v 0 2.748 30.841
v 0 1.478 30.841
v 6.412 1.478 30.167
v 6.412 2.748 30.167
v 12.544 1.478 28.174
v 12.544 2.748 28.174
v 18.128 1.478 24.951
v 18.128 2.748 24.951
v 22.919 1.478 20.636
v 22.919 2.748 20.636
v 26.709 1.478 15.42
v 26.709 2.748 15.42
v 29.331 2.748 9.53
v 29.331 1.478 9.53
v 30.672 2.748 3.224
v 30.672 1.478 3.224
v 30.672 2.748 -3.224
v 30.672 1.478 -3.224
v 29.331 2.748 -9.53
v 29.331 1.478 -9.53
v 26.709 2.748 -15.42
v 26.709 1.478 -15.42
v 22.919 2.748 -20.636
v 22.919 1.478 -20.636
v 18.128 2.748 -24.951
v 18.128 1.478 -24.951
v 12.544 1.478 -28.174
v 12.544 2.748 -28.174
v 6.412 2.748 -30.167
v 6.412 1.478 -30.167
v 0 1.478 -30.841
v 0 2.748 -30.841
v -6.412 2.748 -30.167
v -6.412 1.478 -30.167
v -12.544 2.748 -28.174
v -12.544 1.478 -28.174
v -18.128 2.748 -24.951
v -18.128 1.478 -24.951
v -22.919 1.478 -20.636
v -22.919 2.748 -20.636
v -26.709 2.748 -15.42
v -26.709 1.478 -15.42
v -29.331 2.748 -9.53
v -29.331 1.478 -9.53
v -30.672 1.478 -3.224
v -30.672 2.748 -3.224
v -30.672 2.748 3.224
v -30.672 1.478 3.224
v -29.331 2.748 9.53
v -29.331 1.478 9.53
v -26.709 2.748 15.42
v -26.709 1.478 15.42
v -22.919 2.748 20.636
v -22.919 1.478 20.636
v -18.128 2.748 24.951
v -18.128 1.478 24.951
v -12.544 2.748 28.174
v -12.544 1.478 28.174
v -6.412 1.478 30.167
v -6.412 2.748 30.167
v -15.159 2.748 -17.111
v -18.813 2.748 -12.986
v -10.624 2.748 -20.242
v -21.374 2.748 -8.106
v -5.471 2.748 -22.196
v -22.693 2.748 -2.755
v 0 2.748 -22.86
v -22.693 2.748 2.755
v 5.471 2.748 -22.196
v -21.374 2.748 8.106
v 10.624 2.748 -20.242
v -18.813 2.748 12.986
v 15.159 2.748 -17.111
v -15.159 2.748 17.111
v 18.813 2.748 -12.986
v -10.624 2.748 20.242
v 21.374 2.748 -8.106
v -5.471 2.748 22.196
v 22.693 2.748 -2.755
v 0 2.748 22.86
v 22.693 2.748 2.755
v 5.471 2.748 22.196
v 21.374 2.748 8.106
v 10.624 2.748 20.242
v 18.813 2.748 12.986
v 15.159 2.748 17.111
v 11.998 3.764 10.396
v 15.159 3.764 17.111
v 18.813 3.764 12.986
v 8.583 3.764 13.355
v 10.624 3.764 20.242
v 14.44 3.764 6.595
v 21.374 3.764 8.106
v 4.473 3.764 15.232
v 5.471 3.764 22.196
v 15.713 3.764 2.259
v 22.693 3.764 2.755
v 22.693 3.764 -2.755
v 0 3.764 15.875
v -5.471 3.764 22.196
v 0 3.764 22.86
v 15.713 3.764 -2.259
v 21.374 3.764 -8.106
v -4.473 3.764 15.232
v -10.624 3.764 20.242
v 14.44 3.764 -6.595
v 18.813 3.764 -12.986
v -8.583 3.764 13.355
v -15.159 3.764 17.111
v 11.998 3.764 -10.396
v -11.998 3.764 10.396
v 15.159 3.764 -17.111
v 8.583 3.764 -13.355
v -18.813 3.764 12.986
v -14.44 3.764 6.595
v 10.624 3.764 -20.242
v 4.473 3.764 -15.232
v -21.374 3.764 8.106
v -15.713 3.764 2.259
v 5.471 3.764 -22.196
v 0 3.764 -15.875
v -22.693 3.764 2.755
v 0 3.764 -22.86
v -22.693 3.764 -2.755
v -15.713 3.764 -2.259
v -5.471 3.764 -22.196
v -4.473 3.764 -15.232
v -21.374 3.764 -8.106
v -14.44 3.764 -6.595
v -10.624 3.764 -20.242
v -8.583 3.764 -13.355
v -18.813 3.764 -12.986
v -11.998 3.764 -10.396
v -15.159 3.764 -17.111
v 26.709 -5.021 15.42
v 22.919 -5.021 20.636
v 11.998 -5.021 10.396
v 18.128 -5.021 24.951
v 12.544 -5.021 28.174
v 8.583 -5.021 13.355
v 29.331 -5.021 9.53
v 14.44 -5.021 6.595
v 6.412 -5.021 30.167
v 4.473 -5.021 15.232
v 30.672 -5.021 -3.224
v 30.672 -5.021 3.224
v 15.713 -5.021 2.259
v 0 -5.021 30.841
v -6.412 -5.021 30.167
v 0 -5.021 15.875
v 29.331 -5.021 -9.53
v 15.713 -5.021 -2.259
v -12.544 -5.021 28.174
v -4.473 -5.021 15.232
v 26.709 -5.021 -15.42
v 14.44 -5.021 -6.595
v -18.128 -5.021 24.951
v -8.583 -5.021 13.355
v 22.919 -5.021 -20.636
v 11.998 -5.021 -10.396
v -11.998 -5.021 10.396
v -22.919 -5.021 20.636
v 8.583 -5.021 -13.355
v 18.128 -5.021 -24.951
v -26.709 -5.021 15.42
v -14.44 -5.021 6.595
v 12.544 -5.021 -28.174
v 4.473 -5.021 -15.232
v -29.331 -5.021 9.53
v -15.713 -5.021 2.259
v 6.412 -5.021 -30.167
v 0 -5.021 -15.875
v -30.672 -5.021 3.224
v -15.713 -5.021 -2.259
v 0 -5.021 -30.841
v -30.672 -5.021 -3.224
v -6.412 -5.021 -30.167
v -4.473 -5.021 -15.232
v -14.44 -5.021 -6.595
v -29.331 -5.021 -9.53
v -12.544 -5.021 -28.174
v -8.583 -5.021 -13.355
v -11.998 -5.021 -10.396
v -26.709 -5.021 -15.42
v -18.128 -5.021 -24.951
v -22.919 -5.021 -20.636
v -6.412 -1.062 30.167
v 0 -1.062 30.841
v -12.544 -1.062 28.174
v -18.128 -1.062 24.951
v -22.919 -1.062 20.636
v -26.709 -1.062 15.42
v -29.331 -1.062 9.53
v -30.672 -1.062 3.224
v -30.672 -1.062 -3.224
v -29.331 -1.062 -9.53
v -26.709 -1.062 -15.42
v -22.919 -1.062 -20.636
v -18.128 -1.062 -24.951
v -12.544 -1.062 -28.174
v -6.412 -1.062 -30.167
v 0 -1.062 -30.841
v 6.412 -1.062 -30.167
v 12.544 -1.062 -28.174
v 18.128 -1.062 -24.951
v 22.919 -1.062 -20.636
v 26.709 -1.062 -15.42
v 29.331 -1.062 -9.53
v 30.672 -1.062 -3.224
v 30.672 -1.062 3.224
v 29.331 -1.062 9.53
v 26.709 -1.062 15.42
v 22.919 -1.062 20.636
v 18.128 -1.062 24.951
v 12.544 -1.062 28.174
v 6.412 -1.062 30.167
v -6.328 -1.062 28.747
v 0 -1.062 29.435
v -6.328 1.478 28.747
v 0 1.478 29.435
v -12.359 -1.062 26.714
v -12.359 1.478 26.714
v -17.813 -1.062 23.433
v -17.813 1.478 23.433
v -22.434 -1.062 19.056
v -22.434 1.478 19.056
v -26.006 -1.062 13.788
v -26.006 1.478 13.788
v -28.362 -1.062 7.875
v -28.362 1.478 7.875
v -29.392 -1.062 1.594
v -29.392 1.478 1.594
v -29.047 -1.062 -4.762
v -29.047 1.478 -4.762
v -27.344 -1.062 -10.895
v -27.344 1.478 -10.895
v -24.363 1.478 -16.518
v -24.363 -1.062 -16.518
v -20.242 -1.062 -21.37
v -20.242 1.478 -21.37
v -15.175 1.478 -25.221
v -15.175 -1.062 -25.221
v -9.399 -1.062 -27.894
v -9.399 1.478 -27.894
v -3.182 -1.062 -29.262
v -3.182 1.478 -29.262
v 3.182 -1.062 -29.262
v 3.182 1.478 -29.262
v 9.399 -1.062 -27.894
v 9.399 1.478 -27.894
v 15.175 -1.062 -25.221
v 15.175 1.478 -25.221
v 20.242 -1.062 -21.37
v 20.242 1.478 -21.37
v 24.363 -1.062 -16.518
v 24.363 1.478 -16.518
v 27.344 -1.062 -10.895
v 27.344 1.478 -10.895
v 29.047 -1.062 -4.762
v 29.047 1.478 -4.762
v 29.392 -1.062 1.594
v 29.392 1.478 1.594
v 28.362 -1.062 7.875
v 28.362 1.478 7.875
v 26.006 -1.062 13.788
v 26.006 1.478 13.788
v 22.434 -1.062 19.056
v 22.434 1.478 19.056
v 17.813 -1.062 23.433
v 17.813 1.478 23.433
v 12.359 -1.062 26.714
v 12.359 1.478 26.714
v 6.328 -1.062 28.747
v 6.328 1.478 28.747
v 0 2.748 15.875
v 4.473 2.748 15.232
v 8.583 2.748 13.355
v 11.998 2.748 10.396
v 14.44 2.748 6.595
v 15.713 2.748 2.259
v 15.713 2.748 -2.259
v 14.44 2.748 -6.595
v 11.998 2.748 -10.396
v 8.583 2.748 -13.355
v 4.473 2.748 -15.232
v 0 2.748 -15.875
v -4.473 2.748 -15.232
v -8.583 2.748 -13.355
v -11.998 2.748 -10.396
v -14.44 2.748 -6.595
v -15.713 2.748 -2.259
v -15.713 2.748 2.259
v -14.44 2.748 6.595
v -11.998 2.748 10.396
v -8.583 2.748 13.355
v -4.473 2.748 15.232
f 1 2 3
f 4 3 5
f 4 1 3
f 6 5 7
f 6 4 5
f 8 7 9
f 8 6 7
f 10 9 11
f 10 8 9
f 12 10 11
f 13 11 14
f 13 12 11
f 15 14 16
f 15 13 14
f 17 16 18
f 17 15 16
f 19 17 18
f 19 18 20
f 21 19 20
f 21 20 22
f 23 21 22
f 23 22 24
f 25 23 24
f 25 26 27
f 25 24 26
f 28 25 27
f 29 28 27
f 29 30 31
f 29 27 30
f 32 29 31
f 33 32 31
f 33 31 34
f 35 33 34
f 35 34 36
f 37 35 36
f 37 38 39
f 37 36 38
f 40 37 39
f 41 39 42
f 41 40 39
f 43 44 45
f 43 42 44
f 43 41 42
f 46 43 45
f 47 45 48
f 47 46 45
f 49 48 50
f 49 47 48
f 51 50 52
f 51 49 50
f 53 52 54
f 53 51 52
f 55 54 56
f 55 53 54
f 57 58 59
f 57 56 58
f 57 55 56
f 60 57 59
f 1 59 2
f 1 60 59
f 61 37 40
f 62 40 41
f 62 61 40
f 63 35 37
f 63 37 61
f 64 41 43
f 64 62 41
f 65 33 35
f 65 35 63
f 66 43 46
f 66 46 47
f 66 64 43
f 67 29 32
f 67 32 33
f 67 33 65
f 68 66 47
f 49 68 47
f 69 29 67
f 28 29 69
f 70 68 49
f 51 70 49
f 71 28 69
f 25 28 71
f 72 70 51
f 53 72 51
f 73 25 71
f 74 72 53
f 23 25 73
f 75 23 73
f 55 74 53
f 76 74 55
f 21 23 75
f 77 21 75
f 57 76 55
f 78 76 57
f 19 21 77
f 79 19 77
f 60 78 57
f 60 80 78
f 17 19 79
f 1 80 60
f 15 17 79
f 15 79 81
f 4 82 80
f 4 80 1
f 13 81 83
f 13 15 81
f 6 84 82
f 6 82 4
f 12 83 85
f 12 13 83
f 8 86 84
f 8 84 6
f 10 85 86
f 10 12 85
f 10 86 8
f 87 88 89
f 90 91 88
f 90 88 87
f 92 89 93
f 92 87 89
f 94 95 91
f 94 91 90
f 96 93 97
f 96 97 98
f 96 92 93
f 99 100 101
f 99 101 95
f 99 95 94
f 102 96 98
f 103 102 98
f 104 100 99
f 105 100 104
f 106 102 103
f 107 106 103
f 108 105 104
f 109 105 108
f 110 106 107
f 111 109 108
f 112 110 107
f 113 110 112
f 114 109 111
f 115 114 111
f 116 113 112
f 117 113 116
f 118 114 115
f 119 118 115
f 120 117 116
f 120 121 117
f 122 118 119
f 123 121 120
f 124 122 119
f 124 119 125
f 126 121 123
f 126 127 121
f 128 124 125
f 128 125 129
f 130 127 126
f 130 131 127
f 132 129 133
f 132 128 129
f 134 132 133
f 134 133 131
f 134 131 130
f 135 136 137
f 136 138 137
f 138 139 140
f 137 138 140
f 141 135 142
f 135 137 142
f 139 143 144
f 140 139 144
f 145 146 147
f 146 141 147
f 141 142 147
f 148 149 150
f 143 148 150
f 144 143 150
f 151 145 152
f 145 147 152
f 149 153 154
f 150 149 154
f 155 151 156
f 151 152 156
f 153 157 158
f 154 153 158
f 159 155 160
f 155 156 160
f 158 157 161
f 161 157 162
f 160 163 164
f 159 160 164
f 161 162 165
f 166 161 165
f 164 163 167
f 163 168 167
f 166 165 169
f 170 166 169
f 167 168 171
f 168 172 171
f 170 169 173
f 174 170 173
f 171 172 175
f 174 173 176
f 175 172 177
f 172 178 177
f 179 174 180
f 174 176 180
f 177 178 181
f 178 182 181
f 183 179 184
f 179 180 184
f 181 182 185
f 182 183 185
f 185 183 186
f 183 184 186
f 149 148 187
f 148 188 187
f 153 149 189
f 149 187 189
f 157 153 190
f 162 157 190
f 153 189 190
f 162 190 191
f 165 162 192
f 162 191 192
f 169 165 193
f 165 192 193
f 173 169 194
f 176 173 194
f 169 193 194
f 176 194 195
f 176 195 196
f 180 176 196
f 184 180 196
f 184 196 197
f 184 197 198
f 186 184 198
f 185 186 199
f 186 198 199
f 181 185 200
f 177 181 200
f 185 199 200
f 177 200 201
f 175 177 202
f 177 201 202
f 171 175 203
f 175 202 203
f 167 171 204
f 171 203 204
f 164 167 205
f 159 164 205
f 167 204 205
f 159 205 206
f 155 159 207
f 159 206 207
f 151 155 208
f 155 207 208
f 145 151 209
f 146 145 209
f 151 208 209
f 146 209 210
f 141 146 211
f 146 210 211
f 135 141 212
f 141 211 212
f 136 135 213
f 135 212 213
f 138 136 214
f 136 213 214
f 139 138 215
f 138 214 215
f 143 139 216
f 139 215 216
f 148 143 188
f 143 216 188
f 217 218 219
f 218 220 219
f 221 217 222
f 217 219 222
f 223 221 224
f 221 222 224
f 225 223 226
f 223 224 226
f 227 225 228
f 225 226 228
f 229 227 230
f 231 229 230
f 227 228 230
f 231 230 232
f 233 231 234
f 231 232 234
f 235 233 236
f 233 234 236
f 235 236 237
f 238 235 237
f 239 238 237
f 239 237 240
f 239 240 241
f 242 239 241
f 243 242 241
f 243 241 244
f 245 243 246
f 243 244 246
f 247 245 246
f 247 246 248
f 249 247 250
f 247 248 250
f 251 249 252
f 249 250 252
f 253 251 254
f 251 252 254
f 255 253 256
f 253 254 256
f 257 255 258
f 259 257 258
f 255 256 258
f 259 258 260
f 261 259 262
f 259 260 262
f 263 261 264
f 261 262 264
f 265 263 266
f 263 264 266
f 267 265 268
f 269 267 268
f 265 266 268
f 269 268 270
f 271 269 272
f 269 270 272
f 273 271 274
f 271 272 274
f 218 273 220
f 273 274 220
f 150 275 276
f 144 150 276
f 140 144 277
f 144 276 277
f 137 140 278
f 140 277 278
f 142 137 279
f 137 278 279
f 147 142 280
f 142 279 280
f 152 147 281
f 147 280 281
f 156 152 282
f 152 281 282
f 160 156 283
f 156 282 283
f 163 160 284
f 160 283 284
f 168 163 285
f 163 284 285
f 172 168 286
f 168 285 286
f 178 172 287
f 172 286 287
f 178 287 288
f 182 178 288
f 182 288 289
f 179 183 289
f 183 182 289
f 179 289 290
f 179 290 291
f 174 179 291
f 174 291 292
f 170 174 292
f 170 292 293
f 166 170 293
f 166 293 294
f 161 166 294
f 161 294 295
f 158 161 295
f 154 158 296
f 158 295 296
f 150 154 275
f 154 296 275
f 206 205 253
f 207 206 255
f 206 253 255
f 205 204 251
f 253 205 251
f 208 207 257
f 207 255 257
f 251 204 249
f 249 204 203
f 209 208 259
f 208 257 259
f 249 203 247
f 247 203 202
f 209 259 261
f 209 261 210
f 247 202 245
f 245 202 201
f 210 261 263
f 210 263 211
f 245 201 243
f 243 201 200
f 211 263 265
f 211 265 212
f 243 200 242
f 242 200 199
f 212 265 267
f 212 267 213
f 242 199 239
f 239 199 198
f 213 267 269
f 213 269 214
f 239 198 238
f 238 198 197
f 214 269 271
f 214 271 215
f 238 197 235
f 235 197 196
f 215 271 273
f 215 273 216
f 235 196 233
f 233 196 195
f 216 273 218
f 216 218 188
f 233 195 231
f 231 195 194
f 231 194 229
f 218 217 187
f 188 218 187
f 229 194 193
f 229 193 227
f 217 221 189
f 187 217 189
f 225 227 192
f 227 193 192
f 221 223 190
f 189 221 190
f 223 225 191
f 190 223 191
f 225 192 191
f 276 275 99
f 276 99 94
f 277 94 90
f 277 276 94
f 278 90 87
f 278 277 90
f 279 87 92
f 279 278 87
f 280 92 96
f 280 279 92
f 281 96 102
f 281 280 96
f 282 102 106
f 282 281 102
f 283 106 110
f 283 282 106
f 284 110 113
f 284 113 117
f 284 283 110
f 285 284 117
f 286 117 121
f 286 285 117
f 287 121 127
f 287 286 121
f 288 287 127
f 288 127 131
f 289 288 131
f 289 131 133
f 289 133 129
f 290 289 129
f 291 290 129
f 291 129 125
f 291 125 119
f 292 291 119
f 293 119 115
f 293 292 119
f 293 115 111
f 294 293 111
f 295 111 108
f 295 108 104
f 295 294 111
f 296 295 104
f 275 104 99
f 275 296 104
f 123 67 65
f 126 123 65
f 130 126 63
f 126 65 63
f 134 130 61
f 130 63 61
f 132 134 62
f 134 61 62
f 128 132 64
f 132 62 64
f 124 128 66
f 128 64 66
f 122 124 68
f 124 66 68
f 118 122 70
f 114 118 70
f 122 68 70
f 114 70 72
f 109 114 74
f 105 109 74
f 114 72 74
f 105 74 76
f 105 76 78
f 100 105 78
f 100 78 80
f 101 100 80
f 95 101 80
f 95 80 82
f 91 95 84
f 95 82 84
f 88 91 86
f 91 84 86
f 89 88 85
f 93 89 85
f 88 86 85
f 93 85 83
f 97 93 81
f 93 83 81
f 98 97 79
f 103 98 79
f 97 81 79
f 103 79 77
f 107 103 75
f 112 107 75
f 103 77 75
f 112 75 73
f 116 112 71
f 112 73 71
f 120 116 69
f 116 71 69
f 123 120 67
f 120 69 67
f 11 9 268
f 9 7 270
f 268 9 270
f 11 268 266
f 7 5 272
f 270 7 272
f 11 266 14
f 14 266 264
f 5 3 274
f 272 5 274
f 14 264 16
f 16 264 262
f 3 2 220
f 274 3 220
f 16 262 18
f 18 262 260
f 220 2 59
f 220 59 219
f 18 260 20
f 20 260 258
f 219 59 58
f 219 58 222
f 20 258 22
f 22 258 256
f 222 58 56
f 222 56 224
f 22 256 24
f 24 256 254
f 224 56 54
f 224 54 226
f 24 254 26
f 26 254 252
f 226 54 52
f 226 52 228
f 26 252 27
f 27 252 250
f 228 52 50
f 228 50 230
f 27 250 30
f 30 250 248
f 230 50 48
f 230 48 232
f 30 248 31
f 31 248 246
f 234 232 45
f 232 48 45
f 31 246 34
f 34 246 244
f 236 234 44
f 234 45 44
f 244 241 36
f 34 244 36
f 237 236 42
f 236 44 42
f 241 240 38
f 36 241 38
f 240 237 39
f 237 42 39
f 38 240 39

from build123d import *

# Parameters (mm, degrees)
BANDAID_START                  = 0.053848
SKETCH3_R                      = 30.84068
SKETCH3_R_2                    = 15.875
BANDAID_SOLUTION_THICKER_DEPTH = 0.053848
SKETCH4_R                      = 22.86
SKETCH4_R_2                    = 15.875
LIP_FOR_BEARING_DEPTH          = 1.016


with BuildPart() as part:
    # Sketch1 → Revolve1 (revolve)
    with BuildSketch(Plane(origin=(0, 0, 0), x_dir=(0, 0, -1), z_dir=(1, 0, 0))):
        Polygon((-15.875, 2.694084), (-15.875, -5.020818), (-30.84068, -5.020818), (-30.84068, -1.062068), (-29.43479, -1.062068), (-29.43479, 1.477932), (-30.84068, 1.477932), (-30.84068, 2.694084), align=None)
    revolve(axis=Axis((0, 0, 0), (0, -1, 0)))

    # Sketch3 → BandAid Solution thicker (add)
    with BuildSketch(Plane(origin=(0, 2.694084, 0), x_dir=(1, 0, 0), z_dir=(0, 1, 0)).offset(BANDAID_START)):
        with Locations(Location((0, 0, 0), (0, 0, 270))):
            Circle(SKETCH3_R)
        with Locations(Location((0, 0, 0), (0, 0, 270))):
            Circle(SKETCH3_R_2, mode=Mode.SUBTRACT)
    extrude(amount=-BANDAID_SOLUTION_THICKER_DEPTH)

    # Sketch4 → Lip for Bearing (add)
    with BuildSketch(Plane(origin=(0, 2.747932, 0), x_dir=(1, 0, 0), z_dir=(0, 1, 0))):
        with Locations(Location((0, 0, 0), (0, 0, 90))):
            Circle(SKETCH4_R)
        with Locations(Location((0, 0, 0), (0, 0, 270))):
            Circle(SKETCH4_R_2, mode=Mode.SUBTRACT)
    extrude(amount=LIP_FOR_BEARING_DEPTH)


solid = part.part
